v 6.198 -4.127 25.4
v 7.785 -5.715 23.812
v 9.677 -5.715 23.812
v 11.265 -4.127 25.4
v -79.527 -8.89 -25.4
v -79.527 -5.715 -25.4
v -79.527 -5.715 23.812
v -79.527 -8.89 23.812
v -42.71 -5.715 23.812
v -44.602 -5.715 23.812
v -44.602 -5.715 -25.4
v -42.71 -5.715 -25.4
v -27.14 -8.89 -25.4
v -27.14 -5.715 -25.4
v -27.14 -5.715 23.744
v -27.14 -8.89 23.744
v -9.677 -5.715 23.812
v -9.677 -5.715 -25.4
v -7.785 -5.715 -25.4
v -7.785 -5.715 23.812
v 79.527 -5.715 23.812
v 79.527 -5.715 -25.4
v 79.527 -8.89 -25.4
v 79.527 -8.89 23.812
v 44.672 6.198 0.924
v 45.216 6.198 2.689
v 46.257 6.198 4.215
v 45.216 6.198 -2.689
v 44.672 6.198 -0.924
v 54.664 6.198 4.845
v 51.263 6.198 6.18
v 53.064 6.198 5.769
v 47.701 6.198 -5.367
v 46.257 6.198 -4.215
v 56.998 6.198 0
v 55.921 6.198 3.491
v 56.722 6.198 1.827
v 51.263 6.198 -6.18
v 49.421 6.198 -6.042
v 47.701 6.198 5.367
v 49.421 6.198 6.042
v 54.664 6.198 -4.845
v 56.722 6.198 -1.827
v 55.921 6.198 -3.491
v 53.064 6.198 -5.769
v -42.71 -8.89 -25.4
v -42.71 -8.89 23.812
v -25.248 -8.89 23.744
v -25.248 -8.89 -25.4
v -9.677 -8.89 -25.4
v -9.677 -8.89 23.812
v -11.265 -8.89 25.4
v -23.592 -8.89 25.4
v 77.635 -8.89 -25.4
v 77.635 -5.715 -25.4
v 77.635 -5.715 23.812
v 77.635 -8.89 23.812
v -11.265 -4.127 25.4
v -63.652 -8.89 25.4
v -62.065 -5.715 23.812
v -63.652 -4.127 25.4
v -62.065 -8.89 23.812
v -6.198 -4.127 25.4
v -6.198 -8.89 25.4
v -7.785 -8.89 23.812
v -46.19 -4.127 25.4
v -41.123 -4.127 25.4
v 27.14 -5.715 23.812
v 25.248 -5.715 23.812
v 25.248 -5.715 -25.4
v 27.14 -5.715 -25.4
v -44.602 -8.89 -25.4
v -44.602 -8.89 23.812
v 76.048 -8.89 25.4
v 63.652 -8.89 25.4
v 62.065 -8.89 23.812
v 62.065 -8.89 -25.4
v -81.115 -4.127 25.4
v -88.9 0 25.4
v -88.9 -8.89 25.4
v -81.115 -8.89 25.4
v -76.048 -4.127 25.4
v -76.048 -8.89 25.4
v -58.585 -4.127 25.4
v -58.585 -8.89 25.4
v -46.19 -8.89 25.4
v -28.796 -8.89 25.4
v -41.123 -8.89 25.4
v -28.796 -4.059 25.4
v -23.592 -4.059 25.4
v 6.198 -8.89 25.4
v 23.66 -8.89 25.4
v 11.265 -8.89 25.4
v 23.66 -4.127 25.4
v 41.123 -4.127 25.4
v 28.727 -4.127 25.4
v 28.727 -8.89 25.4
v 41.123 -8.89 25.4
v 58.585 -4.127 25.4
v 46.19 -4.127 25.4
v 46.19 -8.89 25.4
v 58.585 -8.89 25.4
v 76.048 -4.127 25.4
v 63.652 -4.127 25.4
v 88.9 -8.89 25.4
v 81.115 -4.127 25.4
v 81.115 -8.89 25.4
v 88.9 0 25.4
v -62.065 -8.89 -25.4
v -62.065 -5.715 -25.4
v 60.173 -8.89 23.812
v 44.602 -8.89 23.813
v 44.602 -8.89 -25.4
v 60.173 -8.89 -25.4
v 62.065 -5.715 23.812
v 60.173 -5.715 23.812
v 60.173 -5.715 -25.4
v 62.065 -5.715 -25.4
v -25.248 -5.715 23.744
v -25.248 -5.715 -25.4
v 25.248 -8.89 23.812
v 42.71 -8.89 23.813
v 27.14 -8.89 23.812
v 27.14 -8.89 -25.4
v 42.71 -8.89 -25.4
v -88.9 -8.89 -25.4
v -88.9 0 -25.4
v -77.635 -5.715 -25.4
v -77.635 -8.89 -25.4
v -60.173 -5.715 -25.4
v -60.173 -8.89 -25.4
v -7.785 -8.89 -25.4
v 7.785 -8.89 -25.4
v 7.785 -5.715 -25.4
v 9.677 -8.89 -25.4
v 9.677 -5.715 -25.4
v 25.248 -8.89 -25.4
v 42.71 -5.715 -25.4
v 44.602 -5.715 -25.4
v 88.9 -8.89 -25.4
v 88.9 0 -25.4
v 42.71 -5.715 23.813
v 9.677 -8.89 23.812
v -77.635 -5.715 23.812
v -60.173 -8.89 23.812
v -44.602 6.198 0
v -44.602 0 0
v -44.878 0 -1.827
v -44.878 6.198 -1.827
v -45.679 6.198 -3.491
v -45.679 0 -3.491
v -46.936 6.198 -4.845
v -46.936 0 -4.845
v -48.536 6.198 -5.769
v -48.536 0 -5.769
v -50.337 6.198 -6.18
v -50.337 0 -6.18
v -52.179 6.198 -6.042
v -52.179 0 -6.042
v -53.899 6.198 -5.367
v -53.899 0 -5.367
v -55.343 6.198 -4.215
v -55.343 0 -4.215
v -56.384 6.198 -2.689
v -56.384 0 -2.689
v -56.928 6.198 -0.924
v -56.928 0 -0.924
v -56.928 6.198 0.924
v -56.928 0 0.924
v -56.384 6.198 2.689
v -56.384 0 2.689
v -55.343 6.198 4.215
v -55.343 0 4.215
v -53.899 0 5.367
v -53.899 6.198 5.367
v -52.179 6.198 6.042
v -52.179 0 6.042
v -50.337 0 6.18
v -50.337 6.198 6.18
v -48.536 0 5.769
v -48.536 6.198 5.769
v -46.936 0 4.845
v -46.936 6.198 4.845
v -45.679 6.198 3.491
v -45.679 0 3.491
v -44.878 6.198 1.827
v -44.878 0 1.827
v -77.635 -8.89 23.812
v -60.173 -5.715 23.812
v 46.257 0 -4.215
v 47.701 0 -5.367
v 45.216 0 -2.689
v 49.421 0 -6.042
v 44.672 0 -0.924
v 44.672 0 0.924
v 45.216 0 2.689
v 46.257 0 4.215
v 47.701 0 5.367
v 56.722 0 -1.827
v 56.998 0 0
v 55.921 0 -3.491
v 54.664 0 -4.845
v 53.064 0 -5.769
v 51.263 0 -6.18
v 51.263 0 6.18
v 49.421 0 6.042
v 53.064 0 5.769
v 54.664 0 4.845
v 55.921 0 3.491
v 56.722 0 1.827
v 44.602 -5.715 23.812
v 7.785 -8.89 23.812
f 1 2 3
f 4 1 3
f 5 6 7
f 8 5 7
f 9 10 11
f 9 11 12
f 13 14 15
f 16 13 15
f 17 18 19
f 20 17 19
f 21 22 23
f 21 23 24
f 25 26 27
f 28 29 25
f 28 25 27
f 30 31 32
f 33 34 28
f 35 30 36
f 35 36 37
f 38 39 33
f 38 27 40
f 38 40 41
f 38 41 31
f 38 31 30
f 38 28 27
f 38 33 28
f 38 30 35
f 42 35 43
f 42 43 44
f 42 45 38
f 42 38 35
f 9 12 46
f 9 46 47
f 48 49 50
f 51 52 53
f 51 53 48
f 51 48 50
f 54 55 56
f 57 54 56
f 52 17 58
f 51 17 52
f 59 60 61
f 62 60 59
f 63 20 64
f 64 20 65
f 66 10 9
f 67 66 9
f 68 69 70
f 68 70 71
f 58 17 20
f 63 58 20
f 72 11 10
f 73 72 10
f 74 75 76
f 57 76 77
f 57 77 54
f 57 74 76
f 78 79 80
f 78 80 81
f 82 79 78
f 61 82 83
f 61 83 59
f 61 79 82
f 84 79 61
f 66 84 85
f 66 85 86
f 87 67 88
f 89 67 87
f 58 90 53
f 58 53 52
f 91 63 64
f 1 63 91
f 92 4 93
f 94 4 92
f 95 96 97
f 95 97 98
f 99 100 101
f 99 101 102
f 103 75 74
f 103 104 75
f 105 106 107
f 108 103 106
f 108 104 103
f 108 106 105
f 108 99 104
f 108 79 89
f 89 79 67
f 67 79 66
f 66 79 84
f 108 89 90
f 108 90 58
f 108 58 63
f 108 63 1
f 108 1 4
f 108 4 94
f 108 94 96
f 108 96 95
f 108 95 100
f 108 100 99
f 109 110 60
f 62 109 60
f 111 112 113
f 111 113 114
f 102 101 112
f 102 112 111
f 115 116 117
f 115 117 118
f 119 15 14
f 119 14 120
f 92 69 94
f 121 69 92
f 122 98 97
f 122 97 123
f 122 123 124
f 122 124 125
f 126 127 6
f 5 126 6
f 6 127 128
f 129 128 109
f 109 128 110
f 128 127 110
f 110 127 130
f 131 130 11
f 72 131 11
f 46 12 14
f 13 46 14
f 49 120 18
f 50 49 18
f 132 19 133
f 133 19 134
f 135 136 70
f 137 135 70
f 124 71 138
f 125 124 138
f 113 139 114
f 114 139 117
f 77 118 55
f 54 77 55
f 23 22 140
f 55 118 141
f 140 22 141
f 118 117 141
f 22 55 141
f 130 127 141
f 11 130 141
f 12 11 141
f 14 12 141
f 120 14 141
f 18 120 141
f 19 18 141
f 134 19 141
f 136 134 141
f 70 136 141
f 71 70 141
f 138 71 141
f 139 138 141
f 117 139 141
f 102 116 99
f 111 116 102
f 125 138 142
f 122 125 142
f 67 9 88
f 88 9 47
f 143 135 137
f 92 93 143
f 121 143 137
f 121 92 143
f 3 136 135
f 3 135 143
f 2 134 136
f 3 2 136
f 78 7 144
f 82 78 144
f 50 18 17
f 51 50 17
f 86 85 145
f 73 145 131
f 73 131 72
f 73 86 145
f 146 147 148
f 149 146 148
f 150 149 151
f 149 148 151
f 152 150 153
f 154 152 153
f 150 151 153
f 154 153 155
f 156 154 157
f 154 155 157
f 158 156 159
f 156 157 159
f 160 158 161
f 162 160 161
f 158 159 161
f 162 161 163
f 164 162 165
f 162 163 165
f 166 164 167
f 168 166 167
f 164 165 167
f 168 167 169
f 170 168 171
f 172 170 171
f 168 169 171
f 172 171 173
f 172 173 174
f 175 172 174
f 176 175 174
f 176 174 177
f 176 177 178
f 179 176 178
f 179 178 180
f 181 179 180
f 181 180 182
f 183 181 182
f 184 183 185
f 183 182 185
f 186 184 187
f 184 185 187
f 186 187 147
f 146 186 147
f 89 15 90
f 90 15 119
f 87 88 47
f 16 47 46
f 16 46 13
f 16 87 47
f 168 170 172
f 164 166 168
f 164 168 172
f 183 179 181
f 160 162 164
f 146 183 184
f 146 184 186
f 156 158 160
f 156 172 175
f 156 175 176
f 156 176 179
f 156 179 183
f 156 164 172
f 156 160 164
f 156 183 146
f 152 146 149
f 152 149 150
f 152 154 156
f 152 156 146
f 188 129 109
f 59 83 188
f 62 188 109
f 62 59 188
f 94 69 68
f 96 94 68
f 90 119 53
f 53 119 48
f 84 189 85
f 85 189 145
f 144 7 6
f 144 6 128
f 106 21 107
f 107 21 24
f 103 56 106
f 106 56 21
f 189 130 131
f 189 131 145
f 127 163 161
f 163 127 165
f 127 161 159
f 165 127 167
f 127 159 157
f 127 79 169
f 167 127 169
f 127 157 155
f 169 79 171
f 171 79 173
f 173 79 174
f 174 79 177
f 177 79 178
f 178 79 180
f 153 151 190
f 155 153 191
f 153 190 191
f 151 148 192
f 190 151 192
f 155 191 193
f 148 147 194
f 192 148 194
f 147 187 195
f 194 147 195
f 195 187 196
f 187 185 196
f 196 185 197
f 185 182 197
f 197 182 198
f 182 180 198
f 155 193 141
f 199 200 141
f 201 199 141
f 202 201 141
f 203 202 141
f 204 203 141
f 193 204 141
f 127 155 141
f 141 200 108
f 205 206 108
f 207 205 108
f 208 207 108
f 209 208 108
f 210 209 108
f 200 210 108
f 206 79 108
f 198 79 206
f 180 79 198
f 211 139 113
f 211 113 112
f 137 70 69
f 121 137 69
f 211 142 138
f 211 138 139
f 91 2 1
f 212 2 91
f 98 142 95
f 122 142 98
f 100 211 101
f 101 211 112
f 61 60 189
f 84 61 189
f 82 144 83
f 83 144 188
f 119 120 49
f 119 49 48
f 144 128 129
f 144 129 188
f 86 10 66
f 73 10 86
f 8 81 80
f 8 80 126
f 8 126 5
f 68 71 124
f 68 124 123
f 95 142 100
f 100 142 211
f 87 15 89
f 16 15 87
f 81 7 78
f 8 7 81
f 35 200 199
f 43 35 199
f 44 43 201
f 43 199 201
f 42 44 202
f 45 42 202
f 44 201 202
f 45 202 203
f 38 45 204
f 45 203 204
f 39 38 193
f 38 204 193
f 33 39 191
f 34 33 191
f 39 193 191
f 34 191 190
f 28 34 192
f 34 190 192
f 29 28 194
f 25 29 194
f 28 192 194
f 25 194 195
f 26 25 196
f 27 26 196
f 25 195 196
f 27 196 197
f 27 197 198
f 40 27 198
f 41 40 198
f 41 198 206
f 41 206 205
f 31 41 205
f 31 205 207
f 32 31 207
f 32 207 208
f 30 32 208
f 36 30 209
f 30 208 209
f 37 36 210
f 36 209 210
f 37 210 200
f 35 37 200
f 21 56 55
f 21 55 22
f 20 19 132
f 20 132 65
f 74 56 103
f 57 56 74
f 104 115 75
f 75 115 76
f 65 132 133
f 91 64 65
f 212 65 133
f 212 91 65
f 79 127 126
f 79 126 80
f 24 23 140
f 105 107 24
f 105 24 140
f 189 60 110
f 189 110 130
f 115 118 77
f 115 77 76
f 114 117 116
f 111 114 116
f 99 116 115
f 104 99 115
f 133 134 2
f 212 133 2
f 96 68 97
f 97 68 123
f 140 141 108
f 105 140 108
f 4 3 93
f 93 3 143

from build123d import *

# Parameters (mm, degrees)
SKETCH_W          = 177.8
SKETCH_H          = 50.8
PAD_DEPTH         = 8.89
CYLINDER_R        = 6.1976
CYLINDER_DEPTH    = 6.1976
CYLINDER001_R     = 6.1976
CYLINDER001_DEPTH = 6.1976
BOX_W             = 1.8923
BOX_H             = 50.8
BOX_DEPTH         = 3.175
BOX001_W          = 1.8923
BOX001_H          = 50.8
BOX001_DEPTH      = 3.175
BOX002_W          = 1.8923
BOX002_H          = 50.8
BOX002_DEPTH      = 3.175
BOX003_W          = 1.8923
BOX003_H          = 50.8
BOX003_DEPTH      = 3.175
BOX004_W          = 1.8923
BOX004_H          = 50.8
BOX004_DEPTH      = 3.175
BOX005_W          = 1.8923
BOX005_H          = 50.8
BOX005_DEPTH      = 3.175
BOX006_W          = 1.8923
BOX006_H          = 50.8
BOX006_DEPTH      = 3.175
BOX007_W          = 1.8923
BOX007_H          = 50.8
BOX007_DEPTH      = 3.175
BOX008_W          = 1.8923
BOX008_H          = 50.8
BOX008_DEPTH      = 3.175
BOX009_W          = 1.8923
BOX009_H          = 50.8
BOX009_DEPTH      = 3.175
CHAMFER_SIZE      = 1.5875
CHAMFER001_SIZE   = 1.5875
CHAMFER002_SIZE   = 1.5875
CHAMFER003_SIZE   = 1.65608
CHAMFER004_SIZE   = 1.5875
CHAMFER005_SIZE   = 1.5875
CHAMFER006_SIZE   = 1.5875
CHAMFER007_SIZE   = 1.5875
CHAMFER008_SIZE   = 1.5875
CHAMFER009_SIZE   = 1.5875


with BuildPart() as part:
    # Sketch → Pad (new body)
    with BuildSketch(Plane.XZ):
        Rectangle(SKETCH_W, SKETCH_H)
    extrude(amount=PAD_DEPTH)

    # Cylinder → Cylinder (join)
    with BuildSketch(Plane(origin=(50.8, 0, 0), x_dir=(1, 0, 0), z_dir=(0, 1, 0))):
        Circle(CYLINDER_R)
    extrude(amount=CYLINDER_DEPTH)

    # Cylinder001 → Cylinder001 (join)
    with BuildSketch(Plane(origin=(-50.8, 0, 0), x_dir=(1, 0, 0), z_dir=(0, 1, 0))):
        Circle(CYLINDER001_R)
    extrude(amount=CYLINDER001_DEPTH)

    # Box → Box (cut)
    with BuildSketch(Plane(origin=(-9.6774, -5.715, -25.4), x_dir=(1, 0, 0), z_dir=(0, -1, 0))):
        with Locations((0.94615, 25.4)):
            Rectangle(BOX_W, BOX_H)
    extrude(amount=BOX_DEPTH, mode=Mode.SUBTRACT)

    # Box001 → Box001 (cut)
    with BuildSketch(Plane(origin=(-27.1399, -5.715, -25.4), x_dir=(1, 0, 0), z_dir=(0, -1, 0))):
        with Locations((0.94615, 25.4)):
            Rectangle(BOX001_W, BOX001_H)
    extrude(amount=BOX001_DEPTH, mode=Mode.SUBTRACT)

    # Box002 → Box002 (cut)
    with BuildSketch(Plane(origin=(-44.6024, -5.715, -25.4), x_dir=(1, 0, 0), z_dir=(0, -1, 0))):
        with Locations((0.94615, 25.4)):
            Rectangle(BOX002_W, BOX002_H)
    extrude(amount=BOX002_DEPTH, mode=Mode.SUBTRACT)

    # Box003 → Box003 (cut)
    with BuildSketch(Plane(origin=(-62.0649, -5.715, -25.4), x_dir=(1, 0, 0), z_dir=(0, -1, 0))):
        with Locations((0.94615, 25.4)):
            Rectangle(BOX003_W, BOX003_H)
    extrude(amount=BOX003_DEPTH, mode=Mode.SUBTRACT)

    # Box004 → Box004 (cut)
    with BuildSketch(Plane(origin=(-79.5274, -5.715, -25.4), x_dir=(1, 0, 0), z_dir=(0, -1, 0))):
        with Locations((0.94615, 25.4)):
            Rectangle(BOX004_W, BOX004_H)
    extrude(amount=BOX004_DEPTH, mode=Mode.SUBTRACT)

    # Box005 → Box005 (cut)
    with BuildSketch(Plane(origin=(7.7851, -5.715, -25.4), x_dir=(1, 0, 0), z_dir=(0, -1, 0))):
        with Locations((0.94615, 25.4)):
            Rectangle(BOX005_W, BOX005_H)
    extrude(amount=BOX005_DEPTH, mode=Mode.SUBTRACT)

    # Box006 → Box006 (cut)
    with BuildSketch(Plane(origin=(25.2476, -5.715, -25.4), x_dir=(1, 0, 0), z_dir=(0, -1, 0))):
        with Locations((0.94615, 25.4)):
            Rectangle(BOX006_W, BOX006_H)
    extrude(amount=BOX006_DEPTH, mode=Mode.SUBTRACT)

    # Box007 → Box007 (cut)
    with BuildSketch(Plane(origin=(42.7101, -5.715, -25.4), x_dir=(1, 0, 0), z_dir=(0, -1, 0))):
        with Locations((0.94615, 25.4)):
            Rectangle(BOX007_W, BOX007_H)
    extrude(amount=BOX007_DEPTH, mode=Mode.SUBTRACT)

    # Box008 → Box008 (cut)
    with BuildSketch(Plane(origin=(60.1726, -5.715, -25.4), x_dir=(1, 0, 0), z_dir=(0, -1, 0))):
        with Locations((0.94615, 25.4)):
            Rectangle(BOX008_W, BOX008_H)
    extrude(amount=BOX008_DEPTH, mode=Mode.SUBTRACT)

    # Box009 → Box009 (cut)
    with BuildSketch(Plane(origin=(77.6351, -5.715, -25.4), x_dir=(1, 0, 0), z_dir=(0, -1, 0))):
        with Locations((0.94615, 25.4)):
            Rectangle(BOX009_W, BOX009_H)
    extrude(amount=BOX009_DEPTH, mode=Mode.SUBTRACT)

    # Chamfer
    chamfer_edges = [part.edges().sort_by_distance(p)[0] for p in [
        (-79.5274, -7.3025, 25.4),
        (-78.58125, -5.715, 25.4),
        (-77.6351, -7.3025, 25.4),
    ]]
    chamfer(chamfer_edges, length=CHAMFER_SIZE)

    # Chamfer001
    chamfer001_edges = [part.edges().sort_by_distance(p)[0] for p in [
        (-62.0649, -7.3025, 25.4),
        (-61.11875, -5.715, 25.4),
        (-60.1726, -7.3025, 25.4),
    ]]
    chamfer(chamfer001_edges, length=CHAMFER001_SIZE)

    # Chamfer002
    chamfer002_edges = [part.edges().sort_by_distance(p)[0] for p in [
        (-43.65625, -5.715, 25.4),
        (-44.6024, -7.3025, 25.4),
        (-42.7101, -7.3025, 25.4),
    ]]
    chamfer(chamfer002_edges, length=CHAMFER002_SIZE)

    # Chamfer003
    chamfer003_edges = [part.edges().sort_by_distance(p)[0] for p in [
        (-27.1399, -7.3025, 25.4),
        (-26.19375, -5.715, 25.4),
        (-25.2476, -7.3025, 25.4),
    ]]
    chamfer(chamfer003_edges, length=CHAMFER003_SIZE)

    # Chamfer004
    chamfer004_edges = [part.edges().sort_by_distance(p)[0] for p in [
        (-9.6774, -7.3025, 25.4),
        (-8.73125, -5.715, 25.4),
        (-7.7851, -7.3025, 25.4),
    ]]
    chamfer(chamfer004_edges, length=CHAMFER004_SIZE)

    # Chamfer005
    chamfer005_edges = [part.edges().sort_by_distance(p)[0] for p in [
        (7.7851, -7.3025, 25.4),
        (8.73125, -5.715, 25.4),
        (9.6774, -7.3025, 25.4),
    ]]
    chamfer(chamfer005_edges, length=CHAMFER005_SIZE)

    # Chamfer006
    chamfer006_edges = [part.edges().sort_by_distance(p)[0] for p in [
        (25.2476, -7.3025, 25.4),
        (26.19375, -5.715, 25.4),
        (27.1399, -7.3025, 25.4),
    ]]
    chamfer(chamfer006_edges, length=CHAMFER006_SIZE)

    # Chamfer007
    chamfer007_edges = [part.edges().sort_by_distance(p)[0] for p in [
        (42.7101, -7.3025, 25.4),
        (43.65625, -5.715, 25.4),
        (44.6024, -7.3025, 25.4),
    ]]
    chamfer(chamfer007_edges, length=CHAMFER007_SIZE)

    # Chamfer008
    chamfer008_edges = [part.edges().sort_by_distance(p)[0] for p in [
        (60.1726, -7.3025, 25.4),
        (61.11875, -5.715, 25.4),
        (62.0649, -7.3025, 25.4),
    ]]
    chamfer(chamfer008_edges, length=CHAMFER008_SIZE)

    # Chamfer009
    chamfer009_edges = [part.edges().sort_by_distance(p)[0] for p in [
        (77.6351, -7.3025, 25.4),
        (78.58125, -5.715, 25.4),
        (79.5274, -7.3025, 25.4),
    ]]
    chamfer(chamfer009_edges, length=CHAMFER009_SIZE)


solid = part.part
